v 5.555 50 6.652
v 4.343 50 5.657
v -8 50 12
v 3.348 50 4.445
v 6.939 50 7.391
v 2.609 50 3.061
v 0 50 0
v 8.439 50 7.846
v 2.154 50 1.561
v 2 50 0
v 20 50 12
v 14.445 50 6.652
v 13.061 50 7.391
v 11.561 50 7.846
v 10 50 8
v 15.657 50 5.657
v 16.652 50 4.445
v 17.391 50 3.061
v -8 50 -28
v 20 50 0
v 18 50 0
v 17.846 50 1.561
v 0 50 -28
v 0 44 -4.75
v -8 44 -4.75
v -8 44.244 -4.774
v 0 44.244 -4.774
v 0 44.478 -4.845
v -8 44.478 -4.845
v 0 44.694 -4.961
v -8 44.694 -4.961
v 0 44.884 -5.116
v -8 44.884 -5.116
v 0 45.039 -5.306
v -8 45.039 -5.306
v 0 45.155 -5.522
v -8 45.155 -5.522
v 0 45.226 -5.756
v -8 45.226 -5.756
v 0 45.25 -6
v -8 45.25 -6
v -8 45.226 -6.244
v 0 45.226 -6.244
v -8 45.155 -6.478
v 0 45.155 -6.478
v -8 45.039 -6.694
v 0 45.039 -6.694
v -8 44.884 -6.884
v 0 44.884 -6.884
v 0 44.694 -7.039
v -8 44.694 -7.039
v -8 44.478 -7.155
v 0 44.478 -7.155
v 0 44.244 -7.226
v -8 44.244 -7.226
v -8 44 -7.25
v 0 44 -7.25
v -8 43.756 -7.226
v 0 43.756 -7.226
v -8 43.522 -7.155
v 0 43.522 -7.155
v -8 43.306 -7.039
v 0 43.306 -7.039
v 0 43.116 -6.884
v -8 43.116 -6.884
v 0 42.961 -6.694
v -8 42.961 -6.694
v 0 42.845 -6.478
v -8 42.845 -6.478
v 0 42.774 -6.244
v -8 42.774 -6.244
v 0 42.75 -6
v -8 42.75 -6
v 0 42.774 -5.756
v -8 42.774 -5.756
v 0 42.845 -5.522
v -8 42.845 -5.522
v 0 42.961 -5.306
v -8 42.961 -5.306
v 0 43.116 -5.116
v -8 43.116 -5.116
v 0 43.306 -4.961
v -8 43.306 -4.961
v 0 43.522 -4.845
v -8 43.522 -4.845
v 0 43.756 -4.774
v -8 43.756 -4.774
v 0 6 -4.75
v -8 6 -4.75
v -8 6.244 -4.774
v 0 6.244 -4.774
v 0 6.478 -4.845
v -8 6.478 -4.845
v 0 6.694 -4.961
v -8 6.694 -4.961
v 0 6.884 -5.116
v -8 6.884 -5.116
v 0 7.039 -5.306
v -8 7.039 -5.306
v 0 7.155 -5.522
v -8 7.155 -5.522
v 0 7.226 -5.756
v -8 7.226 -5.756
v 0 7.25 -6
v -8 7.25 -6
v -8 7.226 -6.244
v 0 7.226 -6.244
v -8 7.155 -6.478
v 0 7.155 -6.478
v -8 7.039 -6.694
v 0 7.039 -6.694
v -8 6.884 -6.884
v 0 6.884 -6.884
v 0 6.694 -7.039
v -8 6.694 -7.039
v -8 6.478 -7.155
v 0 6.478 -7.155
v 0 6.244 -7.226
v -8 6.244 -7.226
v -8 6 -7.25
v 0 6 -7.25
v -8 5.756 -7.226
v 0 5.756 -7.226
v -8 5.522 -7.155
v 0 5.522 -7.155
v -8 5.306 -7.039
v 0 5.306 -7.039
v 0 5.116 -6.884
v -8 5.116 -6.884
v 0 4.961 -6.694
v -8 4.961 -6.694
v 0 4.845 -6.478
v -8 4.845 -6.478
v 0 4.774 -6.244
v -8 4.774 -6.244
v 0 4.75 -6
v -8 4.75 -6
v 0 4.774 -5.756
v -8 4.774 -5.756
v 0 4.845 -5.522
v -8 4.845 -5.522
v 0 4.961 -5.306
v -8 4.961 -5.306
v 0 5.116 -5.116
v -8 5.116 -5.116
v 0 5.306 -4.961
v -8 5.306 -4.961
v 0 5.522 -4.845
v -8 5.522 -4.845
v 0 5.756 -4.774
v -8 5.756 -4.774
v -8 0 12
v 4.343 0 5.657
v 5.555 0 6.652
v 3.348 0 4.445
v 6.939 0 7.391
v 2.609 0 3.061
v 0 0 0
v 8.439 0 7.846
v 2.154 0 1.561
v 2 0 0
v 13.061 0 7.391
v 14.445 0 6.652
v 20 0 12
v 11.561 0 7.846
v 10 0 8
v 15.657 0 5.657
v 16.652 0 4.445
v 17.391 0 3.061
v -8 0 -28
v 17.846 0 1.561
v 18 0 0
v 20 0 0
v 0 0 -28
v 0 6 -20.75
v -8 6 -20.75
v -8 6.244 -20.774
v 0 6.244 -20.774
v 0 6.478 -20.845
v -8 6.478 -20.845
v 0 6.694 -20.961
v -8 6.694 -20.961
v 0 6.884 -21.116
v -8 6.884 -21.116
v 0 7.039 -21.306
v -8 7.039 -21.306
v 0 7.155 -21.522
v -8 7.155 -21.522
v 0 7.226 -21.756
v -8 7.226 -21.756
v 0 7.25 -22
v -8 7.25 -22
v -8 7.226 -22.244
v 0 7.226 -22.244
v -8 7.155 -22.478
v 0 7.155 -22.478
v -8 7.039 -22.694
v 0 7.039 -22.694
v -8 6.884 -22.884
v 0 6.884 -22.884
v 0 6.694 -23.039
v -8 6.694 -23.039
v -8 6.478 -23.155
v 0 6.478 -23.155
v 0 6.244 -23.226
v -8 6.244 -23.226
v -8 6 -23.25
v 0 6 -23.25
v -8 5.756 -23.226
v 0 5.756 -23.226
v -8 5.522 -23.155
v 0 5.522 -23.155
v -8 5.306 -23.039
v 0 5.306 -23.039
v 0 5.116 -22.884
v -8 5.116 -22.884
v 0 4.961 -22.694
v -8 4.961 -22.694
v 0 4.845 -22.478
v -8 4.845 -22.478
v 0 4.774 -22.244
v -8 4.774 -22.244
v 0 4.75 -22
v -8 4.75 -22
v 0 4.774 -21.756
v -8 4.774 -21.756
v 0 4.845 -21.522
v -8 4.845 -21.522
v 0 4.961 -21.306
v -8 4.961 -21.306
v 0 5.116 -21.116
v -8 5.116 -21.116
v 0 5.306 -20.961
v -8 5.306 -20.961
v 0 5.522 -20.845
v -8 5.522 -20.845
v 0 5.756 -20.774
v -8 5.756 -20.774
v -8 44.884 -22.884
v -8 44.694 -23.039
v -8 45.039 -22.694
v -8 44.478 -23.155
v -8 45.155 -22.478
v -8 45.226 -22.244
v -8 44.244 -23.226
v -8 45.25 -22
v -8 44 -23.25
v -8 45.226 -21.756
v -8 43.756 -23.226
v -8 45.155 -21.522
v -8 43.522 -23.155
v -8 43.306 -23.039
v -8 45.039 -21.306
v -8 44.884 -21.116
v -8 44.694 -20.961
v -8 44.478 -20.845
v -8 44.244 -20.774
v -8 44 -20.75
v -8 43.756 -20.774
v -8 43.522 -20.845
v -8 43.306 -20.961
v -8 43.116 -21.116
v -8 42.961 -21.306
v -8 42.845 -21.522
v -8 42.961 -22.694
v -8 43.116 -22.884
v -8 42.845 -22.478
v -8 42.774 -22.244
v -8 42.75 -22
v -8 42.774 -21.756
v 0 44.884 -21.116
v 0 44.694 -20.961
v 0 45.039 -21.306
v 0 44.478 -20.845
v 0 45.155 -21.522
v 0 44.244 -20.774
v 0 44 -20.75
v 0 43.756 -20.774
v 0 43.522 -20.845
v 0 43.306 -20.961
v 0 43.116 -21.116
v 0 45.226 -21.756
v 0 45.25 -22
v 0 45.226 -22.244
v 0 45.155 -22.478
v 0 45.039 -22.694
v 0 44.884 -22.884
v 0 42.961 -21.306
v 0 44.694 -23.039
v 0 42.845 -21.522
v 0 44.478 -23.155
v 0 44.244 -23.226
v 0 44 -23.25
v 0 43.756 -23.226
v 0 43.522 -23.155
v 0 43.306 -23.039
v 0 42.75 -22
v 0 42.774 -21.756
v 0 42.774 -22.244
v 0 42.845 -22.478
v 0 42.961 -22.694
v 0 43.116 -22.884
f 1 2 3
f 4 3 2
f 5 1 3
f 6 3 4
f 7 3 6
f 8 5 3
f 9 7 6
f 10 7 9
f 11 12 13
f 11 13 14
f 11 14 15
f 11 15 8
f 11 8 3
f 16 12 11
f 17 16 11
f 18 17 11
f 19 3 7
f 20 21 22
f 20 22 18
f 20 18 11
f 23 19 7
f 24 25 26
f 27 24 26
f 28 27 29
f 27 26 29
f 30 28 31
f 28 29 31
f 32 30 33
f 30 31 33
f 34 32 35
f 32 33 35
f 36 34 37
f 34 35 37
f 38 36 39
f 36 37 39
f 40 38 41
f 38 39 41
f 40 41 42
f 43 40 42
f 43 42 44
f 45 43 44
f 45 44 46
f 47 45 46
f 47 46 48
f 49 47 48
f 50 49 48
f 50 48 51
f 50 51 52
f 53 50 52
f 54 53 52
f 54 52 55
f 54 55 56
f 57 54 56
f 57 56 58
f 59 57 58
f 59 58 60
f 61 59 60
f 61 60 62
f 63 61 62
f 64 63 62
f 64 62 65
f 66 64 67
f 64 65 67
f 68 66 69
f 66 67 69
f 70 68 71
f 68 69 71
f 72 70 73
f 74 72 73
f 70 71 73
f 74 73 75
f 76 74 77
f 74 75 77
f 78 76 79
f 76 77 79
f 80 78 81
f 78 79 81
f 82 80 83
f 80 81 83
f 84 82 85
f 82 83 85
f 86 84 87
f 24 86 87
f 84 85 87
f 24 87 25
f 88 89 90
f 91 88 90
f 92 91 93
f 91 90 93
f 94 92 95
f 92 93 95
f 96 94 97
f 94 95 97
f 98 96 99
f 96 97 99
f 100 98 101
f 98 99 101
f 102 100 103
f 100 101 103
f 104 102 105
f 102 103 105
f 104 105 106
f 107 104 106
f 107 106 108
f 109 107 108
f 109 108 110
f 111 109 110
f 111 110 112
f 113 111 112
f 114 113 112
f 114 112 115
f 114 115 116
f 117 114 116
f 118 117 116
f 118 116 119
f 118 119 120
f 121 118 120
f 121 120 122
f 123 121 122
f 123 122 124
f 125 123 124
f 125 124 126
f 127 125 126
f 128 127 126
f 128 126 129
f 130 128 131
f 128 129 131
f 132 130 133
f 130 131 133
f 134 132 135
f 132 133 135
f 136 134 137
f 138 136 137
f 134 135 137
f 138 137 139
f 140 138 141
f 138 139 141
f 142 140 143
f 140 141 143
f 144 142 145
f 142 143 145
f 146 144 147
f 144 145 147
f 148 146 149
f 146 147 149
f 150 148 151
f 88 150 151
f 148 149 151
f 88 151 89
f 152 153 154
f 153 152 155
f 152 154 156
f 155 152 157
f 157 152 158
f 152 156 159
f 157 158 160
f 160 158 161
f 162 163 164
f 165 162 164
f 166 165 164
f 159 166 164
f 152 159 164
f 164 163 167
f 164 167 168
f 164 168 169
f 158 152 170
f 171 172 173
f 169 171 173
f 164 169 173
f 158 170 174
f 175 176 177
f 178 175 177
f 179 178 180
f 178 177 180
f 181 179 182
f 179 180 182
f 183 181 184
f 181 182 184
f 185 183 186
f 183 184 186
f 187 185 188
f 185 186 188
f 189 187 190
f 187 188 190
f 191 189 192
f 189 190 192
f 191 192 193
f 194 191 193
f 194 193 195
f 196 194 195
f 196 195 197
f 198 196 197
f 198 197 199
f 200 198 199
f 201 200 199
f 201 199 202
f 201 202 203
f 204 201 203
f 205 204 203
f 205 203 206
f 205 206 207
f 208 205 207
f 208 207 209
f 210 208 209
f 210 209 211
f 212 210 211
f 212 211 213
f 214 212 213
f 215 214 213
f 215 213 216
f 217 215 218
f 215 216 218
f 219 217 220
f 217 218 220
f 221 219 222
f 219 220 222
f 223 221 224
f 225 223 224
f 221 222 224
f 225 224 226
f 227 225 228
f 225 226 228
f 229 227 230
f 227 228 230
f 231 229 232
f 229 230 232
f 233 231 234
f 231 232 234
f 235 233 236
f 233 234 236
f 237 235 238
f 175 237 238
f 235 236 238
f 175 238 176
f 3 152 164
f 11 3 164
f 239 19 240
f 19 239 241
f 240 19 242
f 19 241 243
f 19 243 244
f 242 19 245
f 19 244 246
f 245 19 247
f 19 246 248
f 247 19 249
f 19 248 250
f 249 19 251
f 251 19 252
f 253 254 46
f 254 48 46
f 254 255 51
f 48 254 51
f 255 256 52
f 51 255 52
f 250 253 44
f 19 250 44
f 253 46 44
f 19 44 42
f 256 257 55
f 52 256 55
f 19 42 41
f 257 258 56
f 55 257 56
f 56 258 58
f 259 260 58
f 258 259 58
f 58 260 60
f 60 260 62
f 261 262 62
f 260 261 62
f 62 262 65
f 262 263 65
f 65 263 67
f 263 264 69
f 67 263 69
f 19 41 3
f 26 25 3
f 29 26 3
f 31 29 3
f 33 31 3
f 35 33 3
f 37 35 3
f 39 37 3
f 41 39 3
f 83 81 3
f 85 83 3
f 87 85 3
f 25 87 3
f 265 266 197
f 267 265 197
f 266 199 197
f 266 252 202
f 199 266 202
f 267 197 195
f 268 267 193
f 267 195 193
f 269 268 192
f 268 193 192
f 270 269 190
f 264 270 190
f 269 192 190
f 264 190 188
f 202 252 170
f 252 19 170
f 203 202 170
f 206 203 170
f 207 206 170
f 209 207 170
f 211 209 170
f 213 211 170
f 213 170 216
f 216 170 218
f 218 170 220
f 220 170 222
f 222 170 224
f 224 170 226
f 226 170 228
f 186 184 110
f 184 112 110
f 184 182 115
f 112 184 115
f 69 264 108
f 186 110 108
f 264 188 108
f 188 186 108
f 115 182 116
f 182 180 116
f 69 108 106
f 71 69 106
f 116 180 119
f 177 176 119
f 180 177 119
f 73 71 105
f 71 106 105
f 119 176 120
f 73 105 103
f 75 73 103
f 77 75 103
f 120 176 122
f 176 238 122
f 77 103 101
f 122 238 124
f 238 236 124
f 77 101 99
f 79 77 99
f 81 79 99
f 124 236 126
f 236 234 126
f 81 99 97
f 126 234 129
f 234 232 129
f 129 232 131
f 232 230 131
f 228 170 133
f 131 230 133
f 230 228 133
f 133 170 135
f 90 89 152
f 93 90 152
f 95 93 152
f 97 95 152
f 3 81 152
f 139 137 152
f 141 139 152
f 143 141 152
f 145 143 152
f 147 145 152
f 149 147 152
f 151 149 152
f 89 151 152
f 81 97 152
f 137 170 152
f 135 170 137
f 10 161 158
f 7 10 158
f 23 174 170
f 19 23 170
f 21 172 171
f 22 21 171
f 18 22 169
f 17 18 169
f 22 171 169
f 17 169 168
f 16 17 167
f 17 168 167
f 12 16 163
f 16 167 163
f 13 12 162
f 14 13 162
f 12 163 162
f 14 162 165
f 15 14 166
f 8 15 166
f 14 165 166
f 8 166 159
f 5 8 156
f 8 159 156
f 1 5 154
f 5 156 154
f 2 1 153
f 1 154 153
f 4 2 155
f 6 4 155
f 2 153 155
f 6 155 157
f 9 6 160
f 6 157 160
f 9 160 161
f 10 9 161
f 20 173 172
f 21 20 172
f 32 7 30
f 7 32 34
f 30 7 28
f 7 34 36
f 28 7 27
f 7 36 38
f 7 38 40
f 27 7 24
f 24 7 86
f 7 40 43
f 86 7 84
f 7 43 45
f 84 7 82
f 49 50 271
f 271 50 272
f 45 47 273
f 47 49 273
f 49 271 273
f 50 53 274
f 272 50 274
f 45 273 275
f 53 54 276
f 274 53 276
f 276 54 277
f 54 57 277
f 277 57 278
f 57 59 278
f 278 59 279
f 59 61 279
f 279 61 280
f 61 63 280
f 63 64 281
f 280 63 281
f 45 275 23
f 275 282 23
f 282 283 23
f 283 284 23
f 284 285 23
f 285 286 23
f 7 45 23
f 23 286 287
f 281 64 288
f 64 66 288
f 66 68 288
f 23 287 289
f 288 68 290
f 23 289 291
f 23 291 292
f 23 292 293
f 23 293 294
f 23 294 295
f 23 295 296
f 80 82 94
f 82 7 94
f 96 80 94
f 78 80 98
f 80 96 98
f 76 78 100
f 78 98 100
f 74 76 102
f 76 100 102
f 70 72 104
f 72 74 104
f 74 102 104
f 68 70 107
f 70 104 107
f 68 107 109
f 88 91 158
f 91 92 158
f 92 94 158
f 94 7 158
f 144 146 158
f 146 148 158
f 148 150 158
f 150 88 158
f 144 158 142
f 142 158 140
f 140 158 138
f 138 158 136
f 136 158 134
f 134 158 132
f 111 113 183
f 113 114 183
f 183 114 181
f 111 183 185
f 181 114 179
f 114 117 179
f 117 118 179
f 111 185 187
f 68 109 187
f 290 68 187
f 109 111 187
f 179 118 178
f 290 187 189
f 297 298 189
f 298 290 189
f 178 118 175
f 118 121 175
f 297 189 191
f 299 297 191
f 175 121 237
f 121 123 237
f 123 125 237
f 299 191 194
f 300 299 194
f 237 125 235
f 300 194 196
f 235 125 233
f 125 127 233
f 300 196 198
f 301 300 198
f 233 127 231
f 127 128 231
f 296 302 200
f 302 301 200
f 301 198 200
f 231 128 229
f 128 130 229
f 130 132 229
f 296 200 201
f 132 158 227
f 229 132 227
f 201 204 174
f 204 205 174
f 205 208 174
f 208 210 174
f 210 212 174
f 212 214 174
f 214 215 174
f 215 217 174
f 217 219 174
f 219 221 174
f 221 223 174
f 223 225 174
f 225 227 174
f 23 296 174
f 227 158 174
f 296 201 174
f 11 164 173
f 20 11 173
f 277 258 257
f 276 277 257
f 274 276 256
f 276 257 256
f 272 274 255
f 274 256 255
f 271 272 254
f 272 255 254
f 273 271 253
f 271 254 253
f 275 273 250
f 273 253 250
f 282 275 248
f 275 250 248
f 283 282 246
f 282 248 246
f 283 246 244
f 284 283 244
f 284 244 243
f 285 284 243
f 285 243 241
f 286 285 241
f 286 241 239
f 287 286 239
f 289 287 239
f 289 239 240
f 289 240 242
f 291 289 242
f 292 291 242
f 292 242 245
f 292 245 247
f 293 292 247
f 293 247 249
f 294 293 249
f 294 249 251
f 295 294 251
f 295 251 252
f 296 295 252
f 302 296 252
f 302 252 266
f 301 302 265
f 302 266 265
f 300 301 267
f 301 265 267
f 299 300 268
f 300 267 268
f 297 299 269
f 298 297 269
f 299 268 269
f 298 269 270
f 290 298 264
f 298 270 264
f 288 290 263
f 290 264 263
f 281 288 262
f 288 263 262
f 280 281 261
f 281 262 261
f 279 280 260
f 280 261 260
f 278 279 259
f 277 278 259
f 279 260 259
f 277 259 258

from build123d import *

# Parameters (mm, degrees)
EXTRUDE_1_DEPTH    = 50
HOLE_WIZARD_M3_1_D = 2.5


with BuildPart() as part:
    # 草图1 → 凸台-拉伸1 (new body)
    with BuildSketch(Plane(origin=(0, 0, 0), x_dir=(1, 0, 0), z_dir=(0, 1, 0))):
        with BuildLine():
            Line((0, 0), (0, 28))
            Line((0, 28), (-8, 28))
            Line((-8, 28), (-8, -12))
            Line((-8, -12), (20, -12))
            Line((20, -12), (20, 0))
            Line((20, 0), (18, 0))
            ThreePointArc((18, 0), (10, -8), (2, 0))
            Line((2, 0), (0, 0))
        make_face()
    extrude(amount=EXTRUDE_1_DEPTH)

    # M3 螺纹孔1 (through all)
    with Locations(Plane(origin=(0, 0, 0), x_dir=(0, 0, -1), z_dir=(1, 0, 0))):
        with Locations((22, 44), (6, 44), (6, 6), (22, 6)):
            Hole(HOLE_WIZARD_M3_1_D / 2)


solid = part.part
